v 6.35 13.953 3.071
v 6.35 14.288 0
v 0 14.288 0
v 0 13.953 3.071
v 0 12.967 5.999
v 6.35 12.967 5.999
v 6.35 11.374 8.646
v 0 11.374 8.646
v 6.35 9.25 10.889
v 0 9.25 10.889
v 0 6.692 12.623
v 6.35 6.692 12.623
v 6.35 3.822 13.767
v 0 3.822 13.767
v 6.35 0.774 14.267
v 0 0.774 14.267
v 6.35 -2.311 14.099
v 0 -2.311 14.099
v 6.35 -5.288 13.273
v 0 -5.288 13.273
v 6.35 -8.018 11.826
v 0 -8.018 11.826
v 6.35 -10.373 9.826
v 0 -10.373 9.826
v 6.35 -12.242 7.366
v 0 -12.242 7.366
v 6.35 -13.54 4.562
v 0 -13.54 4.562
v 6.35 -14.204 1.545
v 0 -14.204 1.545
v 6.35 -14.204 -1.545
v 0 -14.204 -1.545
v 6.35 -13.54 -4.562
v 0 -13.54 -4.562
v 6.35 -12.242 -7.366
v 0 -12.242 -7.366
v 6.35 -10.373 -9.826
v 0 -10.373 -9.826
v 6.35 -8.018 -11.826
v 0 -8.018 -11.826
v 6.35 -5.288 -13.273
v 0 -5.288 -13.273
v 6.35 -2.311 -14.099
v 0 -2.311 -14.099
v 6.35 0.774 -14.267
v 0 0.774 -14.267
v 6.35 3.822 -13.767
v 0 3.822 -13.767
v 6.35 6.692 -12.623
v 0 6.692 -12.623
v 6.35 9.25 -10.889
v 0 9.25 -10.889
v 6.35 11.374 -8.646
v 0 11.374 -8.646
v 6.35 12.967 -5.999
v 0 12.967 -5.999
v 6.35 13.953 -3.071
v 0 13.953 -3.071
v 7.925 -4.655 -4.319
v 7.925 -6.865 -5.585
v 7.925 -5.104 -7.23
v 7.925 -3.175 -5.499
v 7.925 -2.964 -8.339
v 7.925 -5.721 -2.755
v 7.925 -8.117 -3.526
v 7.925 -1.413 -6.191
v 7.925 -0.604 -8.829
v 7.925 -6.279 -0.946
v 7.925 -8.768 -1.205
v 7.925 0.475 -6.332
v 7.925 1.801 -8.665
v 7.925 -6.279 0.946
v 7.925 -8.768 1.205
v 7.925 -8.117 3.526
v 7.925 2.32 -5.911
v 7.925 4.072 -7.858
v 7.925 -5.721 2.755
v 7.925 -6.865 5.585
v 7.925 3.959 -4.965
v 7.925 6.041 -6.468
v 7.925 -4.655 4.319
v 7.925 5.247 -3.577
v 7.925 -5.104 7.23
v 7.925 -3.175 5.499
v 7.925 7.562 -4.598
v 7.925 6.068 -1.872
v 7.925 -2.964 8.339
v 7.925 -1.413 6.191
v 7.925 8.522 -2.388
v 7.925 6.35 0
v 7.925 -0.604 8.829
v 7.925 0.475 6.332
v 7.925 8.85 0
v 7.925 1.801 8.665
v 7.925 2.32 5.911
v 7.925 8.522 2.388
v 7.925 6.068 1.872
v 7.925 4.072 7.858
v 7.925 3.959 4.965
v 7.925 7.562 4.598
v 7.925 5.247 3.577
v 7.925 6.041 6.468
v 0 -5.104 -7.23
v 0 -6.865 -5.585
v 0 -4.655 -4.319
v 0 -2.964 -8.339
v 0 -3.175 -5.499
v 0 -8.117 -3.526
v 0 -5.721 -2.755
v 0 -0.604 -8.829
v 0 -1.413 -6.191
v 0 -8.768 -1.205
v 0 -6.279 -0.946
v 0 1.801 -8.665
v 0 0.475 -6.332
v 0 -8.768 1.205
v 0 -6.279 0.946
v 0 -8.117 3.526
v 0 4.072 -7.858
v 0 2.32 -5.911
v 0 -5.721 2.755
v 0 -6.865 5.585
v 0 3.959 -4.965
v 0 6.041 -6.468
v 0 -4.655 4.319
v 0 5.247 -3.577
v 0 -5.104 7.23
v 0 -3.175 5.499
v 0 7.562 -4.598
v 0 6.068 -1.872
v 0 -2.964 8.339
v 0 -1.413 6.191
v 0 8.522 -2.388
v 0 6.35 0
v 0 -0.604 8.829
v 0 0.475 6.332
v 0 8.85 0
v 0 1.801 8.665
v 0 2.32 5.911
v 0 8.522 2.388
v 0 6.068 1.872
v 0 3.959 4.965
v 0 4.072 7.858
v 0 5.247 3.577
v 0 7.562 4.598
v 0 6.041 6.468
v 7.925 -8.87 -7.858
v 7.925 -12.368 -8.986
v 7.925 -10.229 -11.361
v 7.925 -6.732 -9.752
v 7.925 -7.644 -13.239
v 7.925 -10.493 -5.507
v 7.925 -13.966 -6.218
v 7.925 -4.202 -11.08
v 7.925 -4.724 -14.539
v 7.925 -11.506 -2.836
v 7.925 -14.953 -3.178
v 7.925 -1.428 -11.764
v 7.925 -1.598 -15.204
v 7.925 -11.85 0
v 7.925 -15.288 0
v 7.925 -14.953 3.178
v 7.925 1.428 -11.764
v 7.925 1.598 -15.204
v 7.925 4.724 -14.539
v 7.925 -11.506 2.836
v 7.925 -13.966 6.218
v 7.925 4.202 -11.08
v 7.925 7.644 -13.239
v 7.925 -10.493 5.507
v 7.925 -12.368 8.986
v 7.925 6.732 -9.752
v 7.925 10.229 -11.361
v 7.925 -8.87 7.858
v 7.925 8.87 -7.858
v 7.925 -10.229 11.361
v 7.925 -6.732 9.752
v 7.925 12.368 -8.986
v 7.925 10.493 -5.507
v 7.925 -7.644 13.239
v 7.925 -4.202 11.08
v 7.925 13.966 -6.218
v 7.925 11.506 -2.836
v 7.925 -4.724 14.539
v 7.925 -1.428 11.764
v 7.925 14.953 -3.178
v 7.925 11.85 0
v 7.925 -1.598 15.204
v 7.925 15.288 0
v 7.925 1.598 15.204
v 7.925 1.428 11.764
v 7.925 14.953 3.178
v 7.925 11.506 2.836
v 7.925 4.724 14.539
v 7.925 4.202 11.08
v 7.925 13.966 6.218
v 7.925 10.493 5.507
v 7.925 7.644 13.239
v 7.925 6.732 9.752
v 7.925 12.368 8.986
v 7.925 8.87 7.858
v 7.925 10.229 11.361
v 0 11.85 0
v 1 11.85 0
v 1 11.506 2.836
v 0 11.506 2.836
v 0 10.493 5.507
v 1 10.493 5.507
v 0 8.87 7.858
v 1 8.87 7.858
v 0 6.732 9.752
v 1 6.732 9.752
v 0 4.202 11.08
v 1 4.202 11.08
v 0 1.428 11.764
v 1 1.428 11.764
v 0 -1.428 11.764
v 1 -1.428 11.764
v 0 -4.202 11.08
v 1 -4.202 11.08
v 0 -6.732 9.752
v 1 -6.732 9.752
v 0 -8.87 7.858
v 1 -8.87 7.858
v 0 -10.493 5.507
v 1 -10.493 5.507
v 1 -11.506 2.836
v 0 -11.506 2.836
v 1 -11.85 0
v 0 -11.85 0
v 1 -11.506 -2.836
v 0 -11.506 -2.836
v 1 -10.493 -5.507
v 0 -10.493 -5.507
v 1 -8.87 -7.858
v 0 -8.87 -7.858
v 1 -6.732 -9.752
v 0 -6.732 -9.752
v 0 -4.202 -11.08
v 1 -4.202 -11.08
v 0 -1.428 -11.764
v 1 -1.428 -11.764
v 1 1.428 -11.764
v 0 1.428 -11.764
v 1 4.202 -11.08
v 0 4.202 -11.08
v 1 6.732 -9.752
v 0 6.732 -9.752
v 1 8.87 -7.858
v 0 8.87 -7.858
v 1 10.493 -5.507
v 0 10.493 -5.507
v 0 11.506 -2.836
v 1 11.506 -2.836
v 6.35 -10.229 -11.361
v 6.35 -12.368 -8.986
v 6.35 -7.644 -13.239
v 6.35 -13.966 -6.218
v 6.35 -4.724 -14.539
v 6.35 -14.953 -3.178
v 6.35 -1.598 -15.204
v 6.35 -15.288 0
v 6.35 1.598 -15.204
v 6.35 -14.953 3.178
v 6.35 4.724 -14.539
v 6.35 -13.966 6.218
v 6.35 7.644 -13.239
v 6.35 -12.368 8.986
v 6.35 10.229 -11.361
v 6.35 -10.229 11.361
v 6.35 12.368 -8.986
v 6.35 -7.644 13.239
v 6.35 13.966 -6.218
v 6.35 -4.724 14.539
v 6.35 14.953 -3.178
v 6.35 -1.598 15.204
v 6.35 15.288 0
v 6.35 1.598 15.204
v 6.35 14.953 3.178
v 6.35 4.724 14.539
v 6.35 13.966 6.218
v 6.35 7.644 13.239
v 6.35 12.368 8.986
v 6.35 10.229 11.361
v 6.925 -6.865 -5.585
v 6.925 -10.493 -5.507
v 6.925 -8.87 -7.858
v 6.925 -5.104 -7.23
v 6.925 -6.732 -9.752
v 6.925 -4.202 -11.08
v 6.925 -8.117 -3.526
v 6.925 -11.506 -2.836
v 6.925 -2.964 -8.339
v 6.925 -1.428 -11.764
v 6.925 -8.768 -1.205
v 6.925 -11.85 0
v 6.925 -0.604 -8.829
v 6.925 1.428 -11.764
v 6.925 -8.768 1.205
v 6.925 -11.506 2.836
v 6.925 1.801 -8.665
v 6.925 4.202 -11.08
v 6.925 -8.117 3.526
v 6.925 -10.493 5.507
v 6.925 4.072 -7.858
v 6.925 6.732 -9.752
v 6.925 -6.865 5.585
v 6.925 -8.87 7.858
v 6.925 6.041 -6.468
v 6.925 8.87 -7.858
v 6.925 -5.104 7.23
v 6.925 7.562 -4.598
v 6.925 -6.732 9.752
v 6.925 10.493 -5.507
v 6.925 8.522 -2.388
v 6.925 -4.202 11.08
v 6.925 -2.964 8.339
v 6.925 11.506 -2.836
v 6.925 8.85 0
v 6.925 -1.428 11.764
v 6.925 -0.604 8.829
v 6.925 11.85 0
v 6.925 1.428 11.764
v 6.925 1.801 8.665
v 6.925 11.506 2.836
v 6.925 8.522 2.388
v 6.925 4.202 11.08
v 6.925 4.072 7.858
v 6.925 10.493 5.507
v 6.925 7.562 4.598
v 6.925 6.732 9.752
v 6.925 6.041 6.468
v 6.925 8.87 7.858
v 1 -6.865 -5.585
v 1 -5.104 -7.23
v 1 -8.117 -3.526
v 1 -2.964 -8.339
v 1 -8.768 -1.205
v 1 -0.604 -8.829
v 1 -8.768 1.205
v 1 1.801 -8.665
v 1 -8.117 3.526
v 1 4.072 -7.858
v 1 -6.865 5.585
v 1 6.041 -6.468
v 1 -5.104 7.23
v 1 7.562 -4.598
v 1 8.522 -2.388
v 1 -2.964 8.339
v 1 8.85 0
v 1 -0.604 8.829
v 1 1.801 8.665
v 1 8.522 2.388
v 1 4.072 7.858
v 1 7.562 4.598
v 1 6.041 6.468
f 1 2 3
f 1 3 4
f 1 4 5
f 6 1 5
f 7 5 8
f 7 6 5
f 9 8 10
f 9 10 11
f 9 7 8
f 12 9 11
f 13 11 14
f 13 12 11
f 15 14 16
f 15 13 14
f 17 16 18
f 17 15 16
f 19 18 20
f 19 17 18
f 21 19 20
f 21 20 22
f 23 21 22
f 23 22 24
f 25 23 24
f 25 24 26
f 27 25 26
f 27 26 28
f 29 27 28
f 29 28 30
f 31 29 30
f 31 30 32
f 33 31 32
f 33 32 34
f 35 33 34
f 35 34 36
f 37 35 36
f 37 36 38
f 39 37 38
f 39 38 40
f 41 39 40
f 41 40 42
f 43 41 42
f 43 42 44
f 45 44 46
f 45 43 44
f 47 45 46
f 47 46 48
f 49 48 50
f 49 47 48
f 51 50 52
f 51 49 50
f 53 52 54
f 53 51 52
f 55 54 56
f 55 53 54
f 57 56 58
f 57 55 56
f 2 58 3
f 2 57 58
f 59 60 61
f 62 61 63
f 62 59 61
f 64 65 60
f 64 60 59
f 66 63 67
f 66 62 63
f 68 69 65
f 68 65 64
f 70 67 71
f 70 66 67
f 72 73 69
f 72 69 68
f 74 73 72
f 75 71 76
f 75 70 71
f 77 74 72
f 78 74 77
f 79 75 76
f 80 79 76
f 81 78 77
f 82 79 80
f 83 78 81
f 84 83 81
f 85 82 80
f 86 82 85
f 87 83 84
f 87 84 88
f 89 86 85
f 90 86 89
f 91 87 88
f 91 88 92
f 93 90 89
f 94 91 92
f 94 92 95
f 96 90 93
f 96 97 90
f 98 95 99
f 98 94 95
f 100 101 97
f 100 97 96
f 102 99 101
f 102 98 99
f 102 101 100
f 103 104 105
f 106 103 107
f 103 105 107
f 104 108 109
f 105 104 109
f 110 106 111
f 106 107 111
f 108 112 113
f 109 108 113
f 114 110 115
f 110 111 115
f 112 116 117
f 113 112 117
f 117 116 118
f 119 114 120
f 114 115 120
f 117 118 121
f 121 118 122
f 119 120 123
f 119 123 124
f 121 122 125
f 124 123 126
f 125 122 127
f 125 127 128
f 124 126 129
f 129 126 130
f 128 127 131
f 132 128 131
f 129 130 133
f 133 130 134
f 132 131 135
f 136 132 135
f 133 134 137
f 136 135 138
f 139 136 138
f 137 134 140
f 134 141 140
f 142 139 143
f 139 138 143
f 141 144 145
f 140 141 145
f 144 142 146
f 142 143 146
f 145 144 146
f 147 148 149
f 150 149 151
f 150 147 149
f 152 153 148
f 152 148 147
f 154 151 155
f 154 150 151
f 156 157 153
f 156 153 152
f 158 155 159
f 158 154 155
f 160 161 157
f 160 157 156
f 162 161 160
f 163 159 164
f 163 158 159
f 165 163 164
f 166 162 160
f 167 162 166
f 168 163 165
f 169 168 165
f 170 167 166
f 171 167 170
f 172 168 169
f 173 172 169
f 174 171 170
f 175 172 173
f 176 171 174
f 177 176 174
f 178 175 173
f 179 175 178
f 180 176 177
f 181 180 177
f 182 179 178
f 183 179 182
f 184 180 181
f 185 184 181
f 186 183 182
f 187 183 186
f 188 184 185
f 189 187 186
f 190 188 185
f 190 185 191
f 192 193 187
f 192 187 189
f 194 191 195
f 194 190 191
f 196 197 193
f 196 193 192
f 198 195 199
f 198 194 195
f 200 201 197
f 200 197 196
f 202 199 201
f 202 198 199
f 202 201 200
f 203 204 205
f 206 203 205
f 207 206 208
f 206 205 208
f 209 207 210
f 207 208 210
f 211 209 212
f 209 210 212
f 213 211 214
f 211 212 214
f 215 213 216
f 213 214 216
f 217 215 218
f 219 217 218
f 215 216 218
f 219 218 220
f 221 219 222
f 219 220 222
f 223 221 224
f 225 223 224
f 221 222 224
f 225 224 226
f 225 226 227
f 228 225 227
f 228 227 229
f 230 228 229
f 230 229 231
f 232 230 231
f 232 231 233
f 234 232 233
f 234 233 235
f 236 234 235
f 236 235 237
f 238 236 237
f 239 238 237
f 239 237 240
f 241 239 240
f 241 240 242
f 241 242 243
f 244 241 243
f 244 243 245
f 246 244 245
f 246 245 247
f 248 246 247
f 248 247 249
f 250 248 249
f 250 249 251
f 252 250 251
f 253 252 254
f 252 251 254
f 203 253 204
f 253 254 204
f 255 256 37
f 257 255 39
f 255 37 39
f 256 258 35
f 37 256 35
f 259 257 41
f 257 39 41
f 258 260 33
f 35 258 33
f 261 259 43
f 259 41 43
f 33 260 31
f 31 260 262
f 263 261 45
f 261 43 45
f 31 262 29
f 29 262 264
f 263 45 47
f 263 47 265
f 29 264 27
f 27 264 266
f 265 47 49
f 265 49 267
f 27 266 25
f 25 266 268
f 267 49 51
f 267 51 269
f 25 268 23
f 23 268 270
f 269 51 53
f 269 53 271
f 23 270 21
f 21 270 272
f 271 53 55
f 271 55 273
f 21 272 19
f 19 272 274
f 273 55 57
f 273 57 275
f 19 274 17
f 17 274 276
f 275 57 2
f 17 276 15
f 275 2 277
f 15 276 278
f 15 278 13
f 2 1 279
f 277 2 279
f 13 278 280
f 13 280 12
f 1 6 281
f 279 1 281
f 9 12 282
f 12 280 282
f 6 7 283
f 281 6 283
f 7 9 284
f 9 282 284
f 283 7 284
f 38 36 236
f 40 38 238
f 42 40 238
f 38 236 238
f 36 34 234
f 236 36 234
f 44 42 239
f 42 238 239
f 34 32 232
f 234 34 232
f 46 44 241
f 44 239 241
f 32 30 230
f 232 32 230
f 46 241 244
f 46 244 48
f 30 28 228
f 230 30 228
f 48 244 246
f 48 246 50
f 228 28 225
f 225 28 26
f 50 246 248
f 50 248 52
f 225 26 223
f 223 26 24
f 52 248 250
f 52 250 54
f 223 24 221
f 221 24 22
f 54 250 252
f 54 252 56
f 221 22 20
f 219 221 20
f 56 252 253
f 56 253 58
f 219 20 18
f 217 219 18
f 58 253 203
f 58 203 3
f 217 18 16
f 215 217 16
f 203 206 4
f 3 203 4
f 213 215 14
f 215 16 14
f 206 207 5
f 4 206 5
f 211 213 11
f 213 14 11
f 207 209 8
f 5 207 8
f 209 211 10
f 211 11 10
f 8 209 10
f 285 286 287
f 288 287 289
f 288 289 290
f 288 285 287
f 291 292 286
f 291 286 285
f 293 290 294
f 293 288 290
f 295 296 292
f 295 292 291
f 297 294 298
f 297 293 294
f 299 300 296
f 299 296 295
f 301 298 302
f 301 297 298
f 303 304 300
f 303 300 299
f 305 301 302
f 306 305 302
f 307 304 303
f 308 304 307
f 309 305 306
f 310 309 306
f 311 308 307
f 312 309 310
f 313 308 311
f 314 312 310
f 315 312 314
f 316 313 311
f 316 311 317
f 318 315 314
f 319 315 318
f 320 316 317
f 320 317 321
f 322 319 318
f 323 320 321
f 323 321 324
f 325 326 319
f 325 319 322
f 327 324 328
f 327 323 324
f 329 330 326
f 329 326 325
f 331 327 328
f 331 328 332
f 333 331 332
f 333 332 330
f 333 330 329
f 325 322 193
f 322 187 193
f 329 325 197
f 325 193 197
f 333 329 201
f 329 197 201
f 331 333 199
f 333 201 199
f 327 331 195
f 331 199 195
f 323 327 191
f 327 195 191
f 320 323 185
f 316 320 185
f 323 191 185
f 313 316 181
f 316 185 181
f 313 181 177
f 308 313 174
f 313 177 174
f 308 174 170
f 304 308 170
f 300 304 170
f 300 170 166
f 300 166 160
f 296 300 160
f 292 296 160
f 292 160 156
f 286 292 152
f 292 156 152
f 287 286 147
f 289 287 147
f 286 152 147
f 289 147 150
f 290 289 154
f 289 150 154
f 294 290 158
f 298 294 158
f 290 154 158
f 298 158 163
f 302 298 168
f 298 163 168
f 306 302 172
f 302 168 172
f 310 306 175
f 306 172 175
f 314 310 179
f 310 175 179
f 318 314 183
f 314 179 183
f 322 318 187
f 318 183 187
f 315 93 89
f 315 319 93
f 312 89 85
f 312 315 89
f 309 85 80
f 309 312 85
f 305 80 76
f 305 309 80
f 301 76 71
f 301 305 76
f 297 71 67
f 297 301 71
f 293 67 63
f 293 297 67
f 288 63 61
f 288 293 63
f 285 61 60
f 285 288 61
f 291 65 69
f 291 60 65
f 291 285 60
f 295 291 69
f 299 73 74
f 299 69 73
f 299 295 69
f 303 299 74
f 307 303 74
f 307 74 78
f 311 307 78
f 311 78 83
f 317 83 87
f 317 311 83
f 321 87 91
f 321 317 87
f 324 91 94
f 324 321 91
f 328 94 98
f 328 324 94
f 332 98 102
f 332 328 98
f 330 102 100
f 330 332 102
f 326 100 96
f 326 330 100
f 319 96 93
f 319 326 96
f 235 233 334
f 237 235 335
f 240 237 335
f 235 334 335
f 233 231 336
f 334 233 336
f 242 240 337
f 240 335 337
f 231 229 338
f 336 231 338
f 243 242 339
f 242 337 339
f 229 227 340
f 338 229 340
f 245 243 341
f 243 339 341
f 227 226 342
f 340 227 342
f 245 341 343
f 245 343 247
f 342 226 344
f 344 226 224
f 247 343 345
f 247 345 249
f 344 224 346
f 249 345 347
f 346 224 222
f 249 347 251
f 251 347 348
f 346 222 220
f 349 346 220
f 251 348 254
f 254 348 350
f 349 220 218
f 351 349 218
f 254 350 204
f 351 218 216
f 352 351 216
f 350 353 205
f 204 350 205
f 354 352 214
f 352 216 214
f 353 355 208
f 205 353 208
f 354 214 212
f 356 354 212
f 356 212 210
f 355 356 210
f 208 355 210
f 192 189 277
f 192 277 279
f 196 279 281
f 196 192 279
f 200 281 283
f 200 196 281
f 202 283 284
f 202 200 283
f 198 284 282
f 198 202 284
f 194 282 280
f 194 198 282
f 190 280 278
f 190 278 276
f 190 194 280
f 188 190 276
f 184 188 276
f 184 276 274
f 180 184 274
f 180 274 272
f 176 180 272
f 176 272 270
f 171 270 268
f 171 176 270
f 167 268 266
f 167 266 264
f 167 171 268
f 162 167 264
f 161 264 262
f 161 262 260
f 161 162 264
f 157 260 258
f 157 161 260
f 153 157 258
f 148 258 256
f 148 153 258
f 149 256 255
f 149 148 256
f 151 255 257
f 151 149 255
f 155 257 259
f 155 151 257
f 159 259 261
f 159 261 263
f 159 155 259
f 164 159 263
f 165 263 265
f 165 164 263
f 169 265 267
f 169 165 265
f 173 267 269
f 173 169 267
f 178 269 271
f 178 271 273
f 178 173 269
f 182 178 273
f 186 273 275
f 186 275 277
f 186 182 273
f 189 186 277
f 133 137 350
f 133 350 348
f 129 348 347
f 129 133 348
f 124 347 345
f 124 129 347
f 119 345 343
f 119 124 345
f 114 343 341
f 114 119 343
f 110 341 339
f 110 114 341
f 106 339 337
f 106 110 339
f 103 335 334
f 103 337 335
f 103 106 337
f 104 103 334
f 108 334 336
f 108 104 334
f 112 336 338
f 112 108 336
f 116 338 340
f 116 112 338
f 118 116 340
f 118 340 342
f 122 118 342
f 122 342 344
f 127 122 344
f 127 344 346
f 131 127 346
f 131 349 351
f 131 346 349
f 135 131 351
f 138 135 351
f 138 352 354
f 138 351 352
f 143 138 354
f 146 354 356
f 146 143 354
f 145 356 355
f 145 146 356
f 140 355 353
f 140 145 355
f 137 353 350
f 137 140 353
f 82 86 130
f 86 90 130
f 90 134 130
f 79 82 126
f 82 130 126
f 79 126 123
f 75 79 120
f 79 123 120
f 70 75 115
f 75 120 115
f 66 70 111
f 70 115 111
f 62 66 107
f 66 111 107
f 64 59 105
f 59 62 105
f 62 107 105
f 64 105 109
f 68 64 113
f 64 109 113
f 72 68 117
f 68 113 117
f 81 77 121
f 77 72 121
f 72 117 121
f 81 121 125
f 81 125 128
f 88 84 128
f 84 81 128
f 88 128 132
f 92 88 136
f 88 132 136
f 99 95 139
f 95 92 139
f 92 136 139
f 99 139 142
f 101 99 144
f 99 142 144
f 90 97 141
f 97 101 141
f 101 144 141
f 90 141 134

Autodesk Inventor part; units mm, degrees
ref_plane "YZ Plane" through (0, 0, 0) normal (1, 0, 0) x (0, 1, 0)
ref_plane "XZ Plane" through (0, 0, 0) normal (0, 1, 0) x (-1, 0, 0)
ref_plane "XY Plane" through (0, 0, 0) normal (0, 0, 1) x (1, 0, 0)
sketch "Sketch1" plane through (0, 0, 0) normal (0, 0, 1) x (1, 0, 0)
  line L0 (0, 14.2875) -> (6.35, 14.2875)
  line L1 (6.35, 14.2875) -> (6.35, 15.2875)
  line L2 (6.35, 15.2875) -> (7.9248, 15.2875)
  line L3 (7.9248, 15.2875) -> (7.9248, 6.35)
  line L4 (7.9248, 6.35) -> (0, 6.35)
  line L5 (0, 6.35) -> (0, 14.2875)
  line L6 (0, 0) -> (7.9248, 0)
  line L7 (0, 11.85) -> (1, 11.85)
  line L8 (1, 11.85) -> (1, 8.85)
  line L9 (1, 8.85) -> (0, 8.85)
  line L10 (0, 8.85) -> (0, 11.85)
  line L11 (7.9248, 8.85) -> (6.9248, 8.85)
  line L12 (6.9248, 8.85) -> (6.9248, 11.85)
  line L13 (6.9248, 11.85) -> (7.9248, 11.85)
  line L14 (7.9248, 11.85) -> (7.9248, 8.85)
  dimension "d0" = 7.9248
  dimension "d2" = 12.7
  dimension "d3" = 28.575
  dimension "d4" = 1.5748
  dimension "d5" = 1
  dimension "d7" = 1
  dimension "d8" = 3
  dimension "d9" = 2.5
revolve "Revolution1" add sketch "Sketch1" angle 360 about axis through (0, 0, 0) along (1, 0, 0) contours L0 L1 L2 L3 L13 L12 L11 L4 L5 L9 L8 L7
properties part number "RoundBearing-1-2-inch"
